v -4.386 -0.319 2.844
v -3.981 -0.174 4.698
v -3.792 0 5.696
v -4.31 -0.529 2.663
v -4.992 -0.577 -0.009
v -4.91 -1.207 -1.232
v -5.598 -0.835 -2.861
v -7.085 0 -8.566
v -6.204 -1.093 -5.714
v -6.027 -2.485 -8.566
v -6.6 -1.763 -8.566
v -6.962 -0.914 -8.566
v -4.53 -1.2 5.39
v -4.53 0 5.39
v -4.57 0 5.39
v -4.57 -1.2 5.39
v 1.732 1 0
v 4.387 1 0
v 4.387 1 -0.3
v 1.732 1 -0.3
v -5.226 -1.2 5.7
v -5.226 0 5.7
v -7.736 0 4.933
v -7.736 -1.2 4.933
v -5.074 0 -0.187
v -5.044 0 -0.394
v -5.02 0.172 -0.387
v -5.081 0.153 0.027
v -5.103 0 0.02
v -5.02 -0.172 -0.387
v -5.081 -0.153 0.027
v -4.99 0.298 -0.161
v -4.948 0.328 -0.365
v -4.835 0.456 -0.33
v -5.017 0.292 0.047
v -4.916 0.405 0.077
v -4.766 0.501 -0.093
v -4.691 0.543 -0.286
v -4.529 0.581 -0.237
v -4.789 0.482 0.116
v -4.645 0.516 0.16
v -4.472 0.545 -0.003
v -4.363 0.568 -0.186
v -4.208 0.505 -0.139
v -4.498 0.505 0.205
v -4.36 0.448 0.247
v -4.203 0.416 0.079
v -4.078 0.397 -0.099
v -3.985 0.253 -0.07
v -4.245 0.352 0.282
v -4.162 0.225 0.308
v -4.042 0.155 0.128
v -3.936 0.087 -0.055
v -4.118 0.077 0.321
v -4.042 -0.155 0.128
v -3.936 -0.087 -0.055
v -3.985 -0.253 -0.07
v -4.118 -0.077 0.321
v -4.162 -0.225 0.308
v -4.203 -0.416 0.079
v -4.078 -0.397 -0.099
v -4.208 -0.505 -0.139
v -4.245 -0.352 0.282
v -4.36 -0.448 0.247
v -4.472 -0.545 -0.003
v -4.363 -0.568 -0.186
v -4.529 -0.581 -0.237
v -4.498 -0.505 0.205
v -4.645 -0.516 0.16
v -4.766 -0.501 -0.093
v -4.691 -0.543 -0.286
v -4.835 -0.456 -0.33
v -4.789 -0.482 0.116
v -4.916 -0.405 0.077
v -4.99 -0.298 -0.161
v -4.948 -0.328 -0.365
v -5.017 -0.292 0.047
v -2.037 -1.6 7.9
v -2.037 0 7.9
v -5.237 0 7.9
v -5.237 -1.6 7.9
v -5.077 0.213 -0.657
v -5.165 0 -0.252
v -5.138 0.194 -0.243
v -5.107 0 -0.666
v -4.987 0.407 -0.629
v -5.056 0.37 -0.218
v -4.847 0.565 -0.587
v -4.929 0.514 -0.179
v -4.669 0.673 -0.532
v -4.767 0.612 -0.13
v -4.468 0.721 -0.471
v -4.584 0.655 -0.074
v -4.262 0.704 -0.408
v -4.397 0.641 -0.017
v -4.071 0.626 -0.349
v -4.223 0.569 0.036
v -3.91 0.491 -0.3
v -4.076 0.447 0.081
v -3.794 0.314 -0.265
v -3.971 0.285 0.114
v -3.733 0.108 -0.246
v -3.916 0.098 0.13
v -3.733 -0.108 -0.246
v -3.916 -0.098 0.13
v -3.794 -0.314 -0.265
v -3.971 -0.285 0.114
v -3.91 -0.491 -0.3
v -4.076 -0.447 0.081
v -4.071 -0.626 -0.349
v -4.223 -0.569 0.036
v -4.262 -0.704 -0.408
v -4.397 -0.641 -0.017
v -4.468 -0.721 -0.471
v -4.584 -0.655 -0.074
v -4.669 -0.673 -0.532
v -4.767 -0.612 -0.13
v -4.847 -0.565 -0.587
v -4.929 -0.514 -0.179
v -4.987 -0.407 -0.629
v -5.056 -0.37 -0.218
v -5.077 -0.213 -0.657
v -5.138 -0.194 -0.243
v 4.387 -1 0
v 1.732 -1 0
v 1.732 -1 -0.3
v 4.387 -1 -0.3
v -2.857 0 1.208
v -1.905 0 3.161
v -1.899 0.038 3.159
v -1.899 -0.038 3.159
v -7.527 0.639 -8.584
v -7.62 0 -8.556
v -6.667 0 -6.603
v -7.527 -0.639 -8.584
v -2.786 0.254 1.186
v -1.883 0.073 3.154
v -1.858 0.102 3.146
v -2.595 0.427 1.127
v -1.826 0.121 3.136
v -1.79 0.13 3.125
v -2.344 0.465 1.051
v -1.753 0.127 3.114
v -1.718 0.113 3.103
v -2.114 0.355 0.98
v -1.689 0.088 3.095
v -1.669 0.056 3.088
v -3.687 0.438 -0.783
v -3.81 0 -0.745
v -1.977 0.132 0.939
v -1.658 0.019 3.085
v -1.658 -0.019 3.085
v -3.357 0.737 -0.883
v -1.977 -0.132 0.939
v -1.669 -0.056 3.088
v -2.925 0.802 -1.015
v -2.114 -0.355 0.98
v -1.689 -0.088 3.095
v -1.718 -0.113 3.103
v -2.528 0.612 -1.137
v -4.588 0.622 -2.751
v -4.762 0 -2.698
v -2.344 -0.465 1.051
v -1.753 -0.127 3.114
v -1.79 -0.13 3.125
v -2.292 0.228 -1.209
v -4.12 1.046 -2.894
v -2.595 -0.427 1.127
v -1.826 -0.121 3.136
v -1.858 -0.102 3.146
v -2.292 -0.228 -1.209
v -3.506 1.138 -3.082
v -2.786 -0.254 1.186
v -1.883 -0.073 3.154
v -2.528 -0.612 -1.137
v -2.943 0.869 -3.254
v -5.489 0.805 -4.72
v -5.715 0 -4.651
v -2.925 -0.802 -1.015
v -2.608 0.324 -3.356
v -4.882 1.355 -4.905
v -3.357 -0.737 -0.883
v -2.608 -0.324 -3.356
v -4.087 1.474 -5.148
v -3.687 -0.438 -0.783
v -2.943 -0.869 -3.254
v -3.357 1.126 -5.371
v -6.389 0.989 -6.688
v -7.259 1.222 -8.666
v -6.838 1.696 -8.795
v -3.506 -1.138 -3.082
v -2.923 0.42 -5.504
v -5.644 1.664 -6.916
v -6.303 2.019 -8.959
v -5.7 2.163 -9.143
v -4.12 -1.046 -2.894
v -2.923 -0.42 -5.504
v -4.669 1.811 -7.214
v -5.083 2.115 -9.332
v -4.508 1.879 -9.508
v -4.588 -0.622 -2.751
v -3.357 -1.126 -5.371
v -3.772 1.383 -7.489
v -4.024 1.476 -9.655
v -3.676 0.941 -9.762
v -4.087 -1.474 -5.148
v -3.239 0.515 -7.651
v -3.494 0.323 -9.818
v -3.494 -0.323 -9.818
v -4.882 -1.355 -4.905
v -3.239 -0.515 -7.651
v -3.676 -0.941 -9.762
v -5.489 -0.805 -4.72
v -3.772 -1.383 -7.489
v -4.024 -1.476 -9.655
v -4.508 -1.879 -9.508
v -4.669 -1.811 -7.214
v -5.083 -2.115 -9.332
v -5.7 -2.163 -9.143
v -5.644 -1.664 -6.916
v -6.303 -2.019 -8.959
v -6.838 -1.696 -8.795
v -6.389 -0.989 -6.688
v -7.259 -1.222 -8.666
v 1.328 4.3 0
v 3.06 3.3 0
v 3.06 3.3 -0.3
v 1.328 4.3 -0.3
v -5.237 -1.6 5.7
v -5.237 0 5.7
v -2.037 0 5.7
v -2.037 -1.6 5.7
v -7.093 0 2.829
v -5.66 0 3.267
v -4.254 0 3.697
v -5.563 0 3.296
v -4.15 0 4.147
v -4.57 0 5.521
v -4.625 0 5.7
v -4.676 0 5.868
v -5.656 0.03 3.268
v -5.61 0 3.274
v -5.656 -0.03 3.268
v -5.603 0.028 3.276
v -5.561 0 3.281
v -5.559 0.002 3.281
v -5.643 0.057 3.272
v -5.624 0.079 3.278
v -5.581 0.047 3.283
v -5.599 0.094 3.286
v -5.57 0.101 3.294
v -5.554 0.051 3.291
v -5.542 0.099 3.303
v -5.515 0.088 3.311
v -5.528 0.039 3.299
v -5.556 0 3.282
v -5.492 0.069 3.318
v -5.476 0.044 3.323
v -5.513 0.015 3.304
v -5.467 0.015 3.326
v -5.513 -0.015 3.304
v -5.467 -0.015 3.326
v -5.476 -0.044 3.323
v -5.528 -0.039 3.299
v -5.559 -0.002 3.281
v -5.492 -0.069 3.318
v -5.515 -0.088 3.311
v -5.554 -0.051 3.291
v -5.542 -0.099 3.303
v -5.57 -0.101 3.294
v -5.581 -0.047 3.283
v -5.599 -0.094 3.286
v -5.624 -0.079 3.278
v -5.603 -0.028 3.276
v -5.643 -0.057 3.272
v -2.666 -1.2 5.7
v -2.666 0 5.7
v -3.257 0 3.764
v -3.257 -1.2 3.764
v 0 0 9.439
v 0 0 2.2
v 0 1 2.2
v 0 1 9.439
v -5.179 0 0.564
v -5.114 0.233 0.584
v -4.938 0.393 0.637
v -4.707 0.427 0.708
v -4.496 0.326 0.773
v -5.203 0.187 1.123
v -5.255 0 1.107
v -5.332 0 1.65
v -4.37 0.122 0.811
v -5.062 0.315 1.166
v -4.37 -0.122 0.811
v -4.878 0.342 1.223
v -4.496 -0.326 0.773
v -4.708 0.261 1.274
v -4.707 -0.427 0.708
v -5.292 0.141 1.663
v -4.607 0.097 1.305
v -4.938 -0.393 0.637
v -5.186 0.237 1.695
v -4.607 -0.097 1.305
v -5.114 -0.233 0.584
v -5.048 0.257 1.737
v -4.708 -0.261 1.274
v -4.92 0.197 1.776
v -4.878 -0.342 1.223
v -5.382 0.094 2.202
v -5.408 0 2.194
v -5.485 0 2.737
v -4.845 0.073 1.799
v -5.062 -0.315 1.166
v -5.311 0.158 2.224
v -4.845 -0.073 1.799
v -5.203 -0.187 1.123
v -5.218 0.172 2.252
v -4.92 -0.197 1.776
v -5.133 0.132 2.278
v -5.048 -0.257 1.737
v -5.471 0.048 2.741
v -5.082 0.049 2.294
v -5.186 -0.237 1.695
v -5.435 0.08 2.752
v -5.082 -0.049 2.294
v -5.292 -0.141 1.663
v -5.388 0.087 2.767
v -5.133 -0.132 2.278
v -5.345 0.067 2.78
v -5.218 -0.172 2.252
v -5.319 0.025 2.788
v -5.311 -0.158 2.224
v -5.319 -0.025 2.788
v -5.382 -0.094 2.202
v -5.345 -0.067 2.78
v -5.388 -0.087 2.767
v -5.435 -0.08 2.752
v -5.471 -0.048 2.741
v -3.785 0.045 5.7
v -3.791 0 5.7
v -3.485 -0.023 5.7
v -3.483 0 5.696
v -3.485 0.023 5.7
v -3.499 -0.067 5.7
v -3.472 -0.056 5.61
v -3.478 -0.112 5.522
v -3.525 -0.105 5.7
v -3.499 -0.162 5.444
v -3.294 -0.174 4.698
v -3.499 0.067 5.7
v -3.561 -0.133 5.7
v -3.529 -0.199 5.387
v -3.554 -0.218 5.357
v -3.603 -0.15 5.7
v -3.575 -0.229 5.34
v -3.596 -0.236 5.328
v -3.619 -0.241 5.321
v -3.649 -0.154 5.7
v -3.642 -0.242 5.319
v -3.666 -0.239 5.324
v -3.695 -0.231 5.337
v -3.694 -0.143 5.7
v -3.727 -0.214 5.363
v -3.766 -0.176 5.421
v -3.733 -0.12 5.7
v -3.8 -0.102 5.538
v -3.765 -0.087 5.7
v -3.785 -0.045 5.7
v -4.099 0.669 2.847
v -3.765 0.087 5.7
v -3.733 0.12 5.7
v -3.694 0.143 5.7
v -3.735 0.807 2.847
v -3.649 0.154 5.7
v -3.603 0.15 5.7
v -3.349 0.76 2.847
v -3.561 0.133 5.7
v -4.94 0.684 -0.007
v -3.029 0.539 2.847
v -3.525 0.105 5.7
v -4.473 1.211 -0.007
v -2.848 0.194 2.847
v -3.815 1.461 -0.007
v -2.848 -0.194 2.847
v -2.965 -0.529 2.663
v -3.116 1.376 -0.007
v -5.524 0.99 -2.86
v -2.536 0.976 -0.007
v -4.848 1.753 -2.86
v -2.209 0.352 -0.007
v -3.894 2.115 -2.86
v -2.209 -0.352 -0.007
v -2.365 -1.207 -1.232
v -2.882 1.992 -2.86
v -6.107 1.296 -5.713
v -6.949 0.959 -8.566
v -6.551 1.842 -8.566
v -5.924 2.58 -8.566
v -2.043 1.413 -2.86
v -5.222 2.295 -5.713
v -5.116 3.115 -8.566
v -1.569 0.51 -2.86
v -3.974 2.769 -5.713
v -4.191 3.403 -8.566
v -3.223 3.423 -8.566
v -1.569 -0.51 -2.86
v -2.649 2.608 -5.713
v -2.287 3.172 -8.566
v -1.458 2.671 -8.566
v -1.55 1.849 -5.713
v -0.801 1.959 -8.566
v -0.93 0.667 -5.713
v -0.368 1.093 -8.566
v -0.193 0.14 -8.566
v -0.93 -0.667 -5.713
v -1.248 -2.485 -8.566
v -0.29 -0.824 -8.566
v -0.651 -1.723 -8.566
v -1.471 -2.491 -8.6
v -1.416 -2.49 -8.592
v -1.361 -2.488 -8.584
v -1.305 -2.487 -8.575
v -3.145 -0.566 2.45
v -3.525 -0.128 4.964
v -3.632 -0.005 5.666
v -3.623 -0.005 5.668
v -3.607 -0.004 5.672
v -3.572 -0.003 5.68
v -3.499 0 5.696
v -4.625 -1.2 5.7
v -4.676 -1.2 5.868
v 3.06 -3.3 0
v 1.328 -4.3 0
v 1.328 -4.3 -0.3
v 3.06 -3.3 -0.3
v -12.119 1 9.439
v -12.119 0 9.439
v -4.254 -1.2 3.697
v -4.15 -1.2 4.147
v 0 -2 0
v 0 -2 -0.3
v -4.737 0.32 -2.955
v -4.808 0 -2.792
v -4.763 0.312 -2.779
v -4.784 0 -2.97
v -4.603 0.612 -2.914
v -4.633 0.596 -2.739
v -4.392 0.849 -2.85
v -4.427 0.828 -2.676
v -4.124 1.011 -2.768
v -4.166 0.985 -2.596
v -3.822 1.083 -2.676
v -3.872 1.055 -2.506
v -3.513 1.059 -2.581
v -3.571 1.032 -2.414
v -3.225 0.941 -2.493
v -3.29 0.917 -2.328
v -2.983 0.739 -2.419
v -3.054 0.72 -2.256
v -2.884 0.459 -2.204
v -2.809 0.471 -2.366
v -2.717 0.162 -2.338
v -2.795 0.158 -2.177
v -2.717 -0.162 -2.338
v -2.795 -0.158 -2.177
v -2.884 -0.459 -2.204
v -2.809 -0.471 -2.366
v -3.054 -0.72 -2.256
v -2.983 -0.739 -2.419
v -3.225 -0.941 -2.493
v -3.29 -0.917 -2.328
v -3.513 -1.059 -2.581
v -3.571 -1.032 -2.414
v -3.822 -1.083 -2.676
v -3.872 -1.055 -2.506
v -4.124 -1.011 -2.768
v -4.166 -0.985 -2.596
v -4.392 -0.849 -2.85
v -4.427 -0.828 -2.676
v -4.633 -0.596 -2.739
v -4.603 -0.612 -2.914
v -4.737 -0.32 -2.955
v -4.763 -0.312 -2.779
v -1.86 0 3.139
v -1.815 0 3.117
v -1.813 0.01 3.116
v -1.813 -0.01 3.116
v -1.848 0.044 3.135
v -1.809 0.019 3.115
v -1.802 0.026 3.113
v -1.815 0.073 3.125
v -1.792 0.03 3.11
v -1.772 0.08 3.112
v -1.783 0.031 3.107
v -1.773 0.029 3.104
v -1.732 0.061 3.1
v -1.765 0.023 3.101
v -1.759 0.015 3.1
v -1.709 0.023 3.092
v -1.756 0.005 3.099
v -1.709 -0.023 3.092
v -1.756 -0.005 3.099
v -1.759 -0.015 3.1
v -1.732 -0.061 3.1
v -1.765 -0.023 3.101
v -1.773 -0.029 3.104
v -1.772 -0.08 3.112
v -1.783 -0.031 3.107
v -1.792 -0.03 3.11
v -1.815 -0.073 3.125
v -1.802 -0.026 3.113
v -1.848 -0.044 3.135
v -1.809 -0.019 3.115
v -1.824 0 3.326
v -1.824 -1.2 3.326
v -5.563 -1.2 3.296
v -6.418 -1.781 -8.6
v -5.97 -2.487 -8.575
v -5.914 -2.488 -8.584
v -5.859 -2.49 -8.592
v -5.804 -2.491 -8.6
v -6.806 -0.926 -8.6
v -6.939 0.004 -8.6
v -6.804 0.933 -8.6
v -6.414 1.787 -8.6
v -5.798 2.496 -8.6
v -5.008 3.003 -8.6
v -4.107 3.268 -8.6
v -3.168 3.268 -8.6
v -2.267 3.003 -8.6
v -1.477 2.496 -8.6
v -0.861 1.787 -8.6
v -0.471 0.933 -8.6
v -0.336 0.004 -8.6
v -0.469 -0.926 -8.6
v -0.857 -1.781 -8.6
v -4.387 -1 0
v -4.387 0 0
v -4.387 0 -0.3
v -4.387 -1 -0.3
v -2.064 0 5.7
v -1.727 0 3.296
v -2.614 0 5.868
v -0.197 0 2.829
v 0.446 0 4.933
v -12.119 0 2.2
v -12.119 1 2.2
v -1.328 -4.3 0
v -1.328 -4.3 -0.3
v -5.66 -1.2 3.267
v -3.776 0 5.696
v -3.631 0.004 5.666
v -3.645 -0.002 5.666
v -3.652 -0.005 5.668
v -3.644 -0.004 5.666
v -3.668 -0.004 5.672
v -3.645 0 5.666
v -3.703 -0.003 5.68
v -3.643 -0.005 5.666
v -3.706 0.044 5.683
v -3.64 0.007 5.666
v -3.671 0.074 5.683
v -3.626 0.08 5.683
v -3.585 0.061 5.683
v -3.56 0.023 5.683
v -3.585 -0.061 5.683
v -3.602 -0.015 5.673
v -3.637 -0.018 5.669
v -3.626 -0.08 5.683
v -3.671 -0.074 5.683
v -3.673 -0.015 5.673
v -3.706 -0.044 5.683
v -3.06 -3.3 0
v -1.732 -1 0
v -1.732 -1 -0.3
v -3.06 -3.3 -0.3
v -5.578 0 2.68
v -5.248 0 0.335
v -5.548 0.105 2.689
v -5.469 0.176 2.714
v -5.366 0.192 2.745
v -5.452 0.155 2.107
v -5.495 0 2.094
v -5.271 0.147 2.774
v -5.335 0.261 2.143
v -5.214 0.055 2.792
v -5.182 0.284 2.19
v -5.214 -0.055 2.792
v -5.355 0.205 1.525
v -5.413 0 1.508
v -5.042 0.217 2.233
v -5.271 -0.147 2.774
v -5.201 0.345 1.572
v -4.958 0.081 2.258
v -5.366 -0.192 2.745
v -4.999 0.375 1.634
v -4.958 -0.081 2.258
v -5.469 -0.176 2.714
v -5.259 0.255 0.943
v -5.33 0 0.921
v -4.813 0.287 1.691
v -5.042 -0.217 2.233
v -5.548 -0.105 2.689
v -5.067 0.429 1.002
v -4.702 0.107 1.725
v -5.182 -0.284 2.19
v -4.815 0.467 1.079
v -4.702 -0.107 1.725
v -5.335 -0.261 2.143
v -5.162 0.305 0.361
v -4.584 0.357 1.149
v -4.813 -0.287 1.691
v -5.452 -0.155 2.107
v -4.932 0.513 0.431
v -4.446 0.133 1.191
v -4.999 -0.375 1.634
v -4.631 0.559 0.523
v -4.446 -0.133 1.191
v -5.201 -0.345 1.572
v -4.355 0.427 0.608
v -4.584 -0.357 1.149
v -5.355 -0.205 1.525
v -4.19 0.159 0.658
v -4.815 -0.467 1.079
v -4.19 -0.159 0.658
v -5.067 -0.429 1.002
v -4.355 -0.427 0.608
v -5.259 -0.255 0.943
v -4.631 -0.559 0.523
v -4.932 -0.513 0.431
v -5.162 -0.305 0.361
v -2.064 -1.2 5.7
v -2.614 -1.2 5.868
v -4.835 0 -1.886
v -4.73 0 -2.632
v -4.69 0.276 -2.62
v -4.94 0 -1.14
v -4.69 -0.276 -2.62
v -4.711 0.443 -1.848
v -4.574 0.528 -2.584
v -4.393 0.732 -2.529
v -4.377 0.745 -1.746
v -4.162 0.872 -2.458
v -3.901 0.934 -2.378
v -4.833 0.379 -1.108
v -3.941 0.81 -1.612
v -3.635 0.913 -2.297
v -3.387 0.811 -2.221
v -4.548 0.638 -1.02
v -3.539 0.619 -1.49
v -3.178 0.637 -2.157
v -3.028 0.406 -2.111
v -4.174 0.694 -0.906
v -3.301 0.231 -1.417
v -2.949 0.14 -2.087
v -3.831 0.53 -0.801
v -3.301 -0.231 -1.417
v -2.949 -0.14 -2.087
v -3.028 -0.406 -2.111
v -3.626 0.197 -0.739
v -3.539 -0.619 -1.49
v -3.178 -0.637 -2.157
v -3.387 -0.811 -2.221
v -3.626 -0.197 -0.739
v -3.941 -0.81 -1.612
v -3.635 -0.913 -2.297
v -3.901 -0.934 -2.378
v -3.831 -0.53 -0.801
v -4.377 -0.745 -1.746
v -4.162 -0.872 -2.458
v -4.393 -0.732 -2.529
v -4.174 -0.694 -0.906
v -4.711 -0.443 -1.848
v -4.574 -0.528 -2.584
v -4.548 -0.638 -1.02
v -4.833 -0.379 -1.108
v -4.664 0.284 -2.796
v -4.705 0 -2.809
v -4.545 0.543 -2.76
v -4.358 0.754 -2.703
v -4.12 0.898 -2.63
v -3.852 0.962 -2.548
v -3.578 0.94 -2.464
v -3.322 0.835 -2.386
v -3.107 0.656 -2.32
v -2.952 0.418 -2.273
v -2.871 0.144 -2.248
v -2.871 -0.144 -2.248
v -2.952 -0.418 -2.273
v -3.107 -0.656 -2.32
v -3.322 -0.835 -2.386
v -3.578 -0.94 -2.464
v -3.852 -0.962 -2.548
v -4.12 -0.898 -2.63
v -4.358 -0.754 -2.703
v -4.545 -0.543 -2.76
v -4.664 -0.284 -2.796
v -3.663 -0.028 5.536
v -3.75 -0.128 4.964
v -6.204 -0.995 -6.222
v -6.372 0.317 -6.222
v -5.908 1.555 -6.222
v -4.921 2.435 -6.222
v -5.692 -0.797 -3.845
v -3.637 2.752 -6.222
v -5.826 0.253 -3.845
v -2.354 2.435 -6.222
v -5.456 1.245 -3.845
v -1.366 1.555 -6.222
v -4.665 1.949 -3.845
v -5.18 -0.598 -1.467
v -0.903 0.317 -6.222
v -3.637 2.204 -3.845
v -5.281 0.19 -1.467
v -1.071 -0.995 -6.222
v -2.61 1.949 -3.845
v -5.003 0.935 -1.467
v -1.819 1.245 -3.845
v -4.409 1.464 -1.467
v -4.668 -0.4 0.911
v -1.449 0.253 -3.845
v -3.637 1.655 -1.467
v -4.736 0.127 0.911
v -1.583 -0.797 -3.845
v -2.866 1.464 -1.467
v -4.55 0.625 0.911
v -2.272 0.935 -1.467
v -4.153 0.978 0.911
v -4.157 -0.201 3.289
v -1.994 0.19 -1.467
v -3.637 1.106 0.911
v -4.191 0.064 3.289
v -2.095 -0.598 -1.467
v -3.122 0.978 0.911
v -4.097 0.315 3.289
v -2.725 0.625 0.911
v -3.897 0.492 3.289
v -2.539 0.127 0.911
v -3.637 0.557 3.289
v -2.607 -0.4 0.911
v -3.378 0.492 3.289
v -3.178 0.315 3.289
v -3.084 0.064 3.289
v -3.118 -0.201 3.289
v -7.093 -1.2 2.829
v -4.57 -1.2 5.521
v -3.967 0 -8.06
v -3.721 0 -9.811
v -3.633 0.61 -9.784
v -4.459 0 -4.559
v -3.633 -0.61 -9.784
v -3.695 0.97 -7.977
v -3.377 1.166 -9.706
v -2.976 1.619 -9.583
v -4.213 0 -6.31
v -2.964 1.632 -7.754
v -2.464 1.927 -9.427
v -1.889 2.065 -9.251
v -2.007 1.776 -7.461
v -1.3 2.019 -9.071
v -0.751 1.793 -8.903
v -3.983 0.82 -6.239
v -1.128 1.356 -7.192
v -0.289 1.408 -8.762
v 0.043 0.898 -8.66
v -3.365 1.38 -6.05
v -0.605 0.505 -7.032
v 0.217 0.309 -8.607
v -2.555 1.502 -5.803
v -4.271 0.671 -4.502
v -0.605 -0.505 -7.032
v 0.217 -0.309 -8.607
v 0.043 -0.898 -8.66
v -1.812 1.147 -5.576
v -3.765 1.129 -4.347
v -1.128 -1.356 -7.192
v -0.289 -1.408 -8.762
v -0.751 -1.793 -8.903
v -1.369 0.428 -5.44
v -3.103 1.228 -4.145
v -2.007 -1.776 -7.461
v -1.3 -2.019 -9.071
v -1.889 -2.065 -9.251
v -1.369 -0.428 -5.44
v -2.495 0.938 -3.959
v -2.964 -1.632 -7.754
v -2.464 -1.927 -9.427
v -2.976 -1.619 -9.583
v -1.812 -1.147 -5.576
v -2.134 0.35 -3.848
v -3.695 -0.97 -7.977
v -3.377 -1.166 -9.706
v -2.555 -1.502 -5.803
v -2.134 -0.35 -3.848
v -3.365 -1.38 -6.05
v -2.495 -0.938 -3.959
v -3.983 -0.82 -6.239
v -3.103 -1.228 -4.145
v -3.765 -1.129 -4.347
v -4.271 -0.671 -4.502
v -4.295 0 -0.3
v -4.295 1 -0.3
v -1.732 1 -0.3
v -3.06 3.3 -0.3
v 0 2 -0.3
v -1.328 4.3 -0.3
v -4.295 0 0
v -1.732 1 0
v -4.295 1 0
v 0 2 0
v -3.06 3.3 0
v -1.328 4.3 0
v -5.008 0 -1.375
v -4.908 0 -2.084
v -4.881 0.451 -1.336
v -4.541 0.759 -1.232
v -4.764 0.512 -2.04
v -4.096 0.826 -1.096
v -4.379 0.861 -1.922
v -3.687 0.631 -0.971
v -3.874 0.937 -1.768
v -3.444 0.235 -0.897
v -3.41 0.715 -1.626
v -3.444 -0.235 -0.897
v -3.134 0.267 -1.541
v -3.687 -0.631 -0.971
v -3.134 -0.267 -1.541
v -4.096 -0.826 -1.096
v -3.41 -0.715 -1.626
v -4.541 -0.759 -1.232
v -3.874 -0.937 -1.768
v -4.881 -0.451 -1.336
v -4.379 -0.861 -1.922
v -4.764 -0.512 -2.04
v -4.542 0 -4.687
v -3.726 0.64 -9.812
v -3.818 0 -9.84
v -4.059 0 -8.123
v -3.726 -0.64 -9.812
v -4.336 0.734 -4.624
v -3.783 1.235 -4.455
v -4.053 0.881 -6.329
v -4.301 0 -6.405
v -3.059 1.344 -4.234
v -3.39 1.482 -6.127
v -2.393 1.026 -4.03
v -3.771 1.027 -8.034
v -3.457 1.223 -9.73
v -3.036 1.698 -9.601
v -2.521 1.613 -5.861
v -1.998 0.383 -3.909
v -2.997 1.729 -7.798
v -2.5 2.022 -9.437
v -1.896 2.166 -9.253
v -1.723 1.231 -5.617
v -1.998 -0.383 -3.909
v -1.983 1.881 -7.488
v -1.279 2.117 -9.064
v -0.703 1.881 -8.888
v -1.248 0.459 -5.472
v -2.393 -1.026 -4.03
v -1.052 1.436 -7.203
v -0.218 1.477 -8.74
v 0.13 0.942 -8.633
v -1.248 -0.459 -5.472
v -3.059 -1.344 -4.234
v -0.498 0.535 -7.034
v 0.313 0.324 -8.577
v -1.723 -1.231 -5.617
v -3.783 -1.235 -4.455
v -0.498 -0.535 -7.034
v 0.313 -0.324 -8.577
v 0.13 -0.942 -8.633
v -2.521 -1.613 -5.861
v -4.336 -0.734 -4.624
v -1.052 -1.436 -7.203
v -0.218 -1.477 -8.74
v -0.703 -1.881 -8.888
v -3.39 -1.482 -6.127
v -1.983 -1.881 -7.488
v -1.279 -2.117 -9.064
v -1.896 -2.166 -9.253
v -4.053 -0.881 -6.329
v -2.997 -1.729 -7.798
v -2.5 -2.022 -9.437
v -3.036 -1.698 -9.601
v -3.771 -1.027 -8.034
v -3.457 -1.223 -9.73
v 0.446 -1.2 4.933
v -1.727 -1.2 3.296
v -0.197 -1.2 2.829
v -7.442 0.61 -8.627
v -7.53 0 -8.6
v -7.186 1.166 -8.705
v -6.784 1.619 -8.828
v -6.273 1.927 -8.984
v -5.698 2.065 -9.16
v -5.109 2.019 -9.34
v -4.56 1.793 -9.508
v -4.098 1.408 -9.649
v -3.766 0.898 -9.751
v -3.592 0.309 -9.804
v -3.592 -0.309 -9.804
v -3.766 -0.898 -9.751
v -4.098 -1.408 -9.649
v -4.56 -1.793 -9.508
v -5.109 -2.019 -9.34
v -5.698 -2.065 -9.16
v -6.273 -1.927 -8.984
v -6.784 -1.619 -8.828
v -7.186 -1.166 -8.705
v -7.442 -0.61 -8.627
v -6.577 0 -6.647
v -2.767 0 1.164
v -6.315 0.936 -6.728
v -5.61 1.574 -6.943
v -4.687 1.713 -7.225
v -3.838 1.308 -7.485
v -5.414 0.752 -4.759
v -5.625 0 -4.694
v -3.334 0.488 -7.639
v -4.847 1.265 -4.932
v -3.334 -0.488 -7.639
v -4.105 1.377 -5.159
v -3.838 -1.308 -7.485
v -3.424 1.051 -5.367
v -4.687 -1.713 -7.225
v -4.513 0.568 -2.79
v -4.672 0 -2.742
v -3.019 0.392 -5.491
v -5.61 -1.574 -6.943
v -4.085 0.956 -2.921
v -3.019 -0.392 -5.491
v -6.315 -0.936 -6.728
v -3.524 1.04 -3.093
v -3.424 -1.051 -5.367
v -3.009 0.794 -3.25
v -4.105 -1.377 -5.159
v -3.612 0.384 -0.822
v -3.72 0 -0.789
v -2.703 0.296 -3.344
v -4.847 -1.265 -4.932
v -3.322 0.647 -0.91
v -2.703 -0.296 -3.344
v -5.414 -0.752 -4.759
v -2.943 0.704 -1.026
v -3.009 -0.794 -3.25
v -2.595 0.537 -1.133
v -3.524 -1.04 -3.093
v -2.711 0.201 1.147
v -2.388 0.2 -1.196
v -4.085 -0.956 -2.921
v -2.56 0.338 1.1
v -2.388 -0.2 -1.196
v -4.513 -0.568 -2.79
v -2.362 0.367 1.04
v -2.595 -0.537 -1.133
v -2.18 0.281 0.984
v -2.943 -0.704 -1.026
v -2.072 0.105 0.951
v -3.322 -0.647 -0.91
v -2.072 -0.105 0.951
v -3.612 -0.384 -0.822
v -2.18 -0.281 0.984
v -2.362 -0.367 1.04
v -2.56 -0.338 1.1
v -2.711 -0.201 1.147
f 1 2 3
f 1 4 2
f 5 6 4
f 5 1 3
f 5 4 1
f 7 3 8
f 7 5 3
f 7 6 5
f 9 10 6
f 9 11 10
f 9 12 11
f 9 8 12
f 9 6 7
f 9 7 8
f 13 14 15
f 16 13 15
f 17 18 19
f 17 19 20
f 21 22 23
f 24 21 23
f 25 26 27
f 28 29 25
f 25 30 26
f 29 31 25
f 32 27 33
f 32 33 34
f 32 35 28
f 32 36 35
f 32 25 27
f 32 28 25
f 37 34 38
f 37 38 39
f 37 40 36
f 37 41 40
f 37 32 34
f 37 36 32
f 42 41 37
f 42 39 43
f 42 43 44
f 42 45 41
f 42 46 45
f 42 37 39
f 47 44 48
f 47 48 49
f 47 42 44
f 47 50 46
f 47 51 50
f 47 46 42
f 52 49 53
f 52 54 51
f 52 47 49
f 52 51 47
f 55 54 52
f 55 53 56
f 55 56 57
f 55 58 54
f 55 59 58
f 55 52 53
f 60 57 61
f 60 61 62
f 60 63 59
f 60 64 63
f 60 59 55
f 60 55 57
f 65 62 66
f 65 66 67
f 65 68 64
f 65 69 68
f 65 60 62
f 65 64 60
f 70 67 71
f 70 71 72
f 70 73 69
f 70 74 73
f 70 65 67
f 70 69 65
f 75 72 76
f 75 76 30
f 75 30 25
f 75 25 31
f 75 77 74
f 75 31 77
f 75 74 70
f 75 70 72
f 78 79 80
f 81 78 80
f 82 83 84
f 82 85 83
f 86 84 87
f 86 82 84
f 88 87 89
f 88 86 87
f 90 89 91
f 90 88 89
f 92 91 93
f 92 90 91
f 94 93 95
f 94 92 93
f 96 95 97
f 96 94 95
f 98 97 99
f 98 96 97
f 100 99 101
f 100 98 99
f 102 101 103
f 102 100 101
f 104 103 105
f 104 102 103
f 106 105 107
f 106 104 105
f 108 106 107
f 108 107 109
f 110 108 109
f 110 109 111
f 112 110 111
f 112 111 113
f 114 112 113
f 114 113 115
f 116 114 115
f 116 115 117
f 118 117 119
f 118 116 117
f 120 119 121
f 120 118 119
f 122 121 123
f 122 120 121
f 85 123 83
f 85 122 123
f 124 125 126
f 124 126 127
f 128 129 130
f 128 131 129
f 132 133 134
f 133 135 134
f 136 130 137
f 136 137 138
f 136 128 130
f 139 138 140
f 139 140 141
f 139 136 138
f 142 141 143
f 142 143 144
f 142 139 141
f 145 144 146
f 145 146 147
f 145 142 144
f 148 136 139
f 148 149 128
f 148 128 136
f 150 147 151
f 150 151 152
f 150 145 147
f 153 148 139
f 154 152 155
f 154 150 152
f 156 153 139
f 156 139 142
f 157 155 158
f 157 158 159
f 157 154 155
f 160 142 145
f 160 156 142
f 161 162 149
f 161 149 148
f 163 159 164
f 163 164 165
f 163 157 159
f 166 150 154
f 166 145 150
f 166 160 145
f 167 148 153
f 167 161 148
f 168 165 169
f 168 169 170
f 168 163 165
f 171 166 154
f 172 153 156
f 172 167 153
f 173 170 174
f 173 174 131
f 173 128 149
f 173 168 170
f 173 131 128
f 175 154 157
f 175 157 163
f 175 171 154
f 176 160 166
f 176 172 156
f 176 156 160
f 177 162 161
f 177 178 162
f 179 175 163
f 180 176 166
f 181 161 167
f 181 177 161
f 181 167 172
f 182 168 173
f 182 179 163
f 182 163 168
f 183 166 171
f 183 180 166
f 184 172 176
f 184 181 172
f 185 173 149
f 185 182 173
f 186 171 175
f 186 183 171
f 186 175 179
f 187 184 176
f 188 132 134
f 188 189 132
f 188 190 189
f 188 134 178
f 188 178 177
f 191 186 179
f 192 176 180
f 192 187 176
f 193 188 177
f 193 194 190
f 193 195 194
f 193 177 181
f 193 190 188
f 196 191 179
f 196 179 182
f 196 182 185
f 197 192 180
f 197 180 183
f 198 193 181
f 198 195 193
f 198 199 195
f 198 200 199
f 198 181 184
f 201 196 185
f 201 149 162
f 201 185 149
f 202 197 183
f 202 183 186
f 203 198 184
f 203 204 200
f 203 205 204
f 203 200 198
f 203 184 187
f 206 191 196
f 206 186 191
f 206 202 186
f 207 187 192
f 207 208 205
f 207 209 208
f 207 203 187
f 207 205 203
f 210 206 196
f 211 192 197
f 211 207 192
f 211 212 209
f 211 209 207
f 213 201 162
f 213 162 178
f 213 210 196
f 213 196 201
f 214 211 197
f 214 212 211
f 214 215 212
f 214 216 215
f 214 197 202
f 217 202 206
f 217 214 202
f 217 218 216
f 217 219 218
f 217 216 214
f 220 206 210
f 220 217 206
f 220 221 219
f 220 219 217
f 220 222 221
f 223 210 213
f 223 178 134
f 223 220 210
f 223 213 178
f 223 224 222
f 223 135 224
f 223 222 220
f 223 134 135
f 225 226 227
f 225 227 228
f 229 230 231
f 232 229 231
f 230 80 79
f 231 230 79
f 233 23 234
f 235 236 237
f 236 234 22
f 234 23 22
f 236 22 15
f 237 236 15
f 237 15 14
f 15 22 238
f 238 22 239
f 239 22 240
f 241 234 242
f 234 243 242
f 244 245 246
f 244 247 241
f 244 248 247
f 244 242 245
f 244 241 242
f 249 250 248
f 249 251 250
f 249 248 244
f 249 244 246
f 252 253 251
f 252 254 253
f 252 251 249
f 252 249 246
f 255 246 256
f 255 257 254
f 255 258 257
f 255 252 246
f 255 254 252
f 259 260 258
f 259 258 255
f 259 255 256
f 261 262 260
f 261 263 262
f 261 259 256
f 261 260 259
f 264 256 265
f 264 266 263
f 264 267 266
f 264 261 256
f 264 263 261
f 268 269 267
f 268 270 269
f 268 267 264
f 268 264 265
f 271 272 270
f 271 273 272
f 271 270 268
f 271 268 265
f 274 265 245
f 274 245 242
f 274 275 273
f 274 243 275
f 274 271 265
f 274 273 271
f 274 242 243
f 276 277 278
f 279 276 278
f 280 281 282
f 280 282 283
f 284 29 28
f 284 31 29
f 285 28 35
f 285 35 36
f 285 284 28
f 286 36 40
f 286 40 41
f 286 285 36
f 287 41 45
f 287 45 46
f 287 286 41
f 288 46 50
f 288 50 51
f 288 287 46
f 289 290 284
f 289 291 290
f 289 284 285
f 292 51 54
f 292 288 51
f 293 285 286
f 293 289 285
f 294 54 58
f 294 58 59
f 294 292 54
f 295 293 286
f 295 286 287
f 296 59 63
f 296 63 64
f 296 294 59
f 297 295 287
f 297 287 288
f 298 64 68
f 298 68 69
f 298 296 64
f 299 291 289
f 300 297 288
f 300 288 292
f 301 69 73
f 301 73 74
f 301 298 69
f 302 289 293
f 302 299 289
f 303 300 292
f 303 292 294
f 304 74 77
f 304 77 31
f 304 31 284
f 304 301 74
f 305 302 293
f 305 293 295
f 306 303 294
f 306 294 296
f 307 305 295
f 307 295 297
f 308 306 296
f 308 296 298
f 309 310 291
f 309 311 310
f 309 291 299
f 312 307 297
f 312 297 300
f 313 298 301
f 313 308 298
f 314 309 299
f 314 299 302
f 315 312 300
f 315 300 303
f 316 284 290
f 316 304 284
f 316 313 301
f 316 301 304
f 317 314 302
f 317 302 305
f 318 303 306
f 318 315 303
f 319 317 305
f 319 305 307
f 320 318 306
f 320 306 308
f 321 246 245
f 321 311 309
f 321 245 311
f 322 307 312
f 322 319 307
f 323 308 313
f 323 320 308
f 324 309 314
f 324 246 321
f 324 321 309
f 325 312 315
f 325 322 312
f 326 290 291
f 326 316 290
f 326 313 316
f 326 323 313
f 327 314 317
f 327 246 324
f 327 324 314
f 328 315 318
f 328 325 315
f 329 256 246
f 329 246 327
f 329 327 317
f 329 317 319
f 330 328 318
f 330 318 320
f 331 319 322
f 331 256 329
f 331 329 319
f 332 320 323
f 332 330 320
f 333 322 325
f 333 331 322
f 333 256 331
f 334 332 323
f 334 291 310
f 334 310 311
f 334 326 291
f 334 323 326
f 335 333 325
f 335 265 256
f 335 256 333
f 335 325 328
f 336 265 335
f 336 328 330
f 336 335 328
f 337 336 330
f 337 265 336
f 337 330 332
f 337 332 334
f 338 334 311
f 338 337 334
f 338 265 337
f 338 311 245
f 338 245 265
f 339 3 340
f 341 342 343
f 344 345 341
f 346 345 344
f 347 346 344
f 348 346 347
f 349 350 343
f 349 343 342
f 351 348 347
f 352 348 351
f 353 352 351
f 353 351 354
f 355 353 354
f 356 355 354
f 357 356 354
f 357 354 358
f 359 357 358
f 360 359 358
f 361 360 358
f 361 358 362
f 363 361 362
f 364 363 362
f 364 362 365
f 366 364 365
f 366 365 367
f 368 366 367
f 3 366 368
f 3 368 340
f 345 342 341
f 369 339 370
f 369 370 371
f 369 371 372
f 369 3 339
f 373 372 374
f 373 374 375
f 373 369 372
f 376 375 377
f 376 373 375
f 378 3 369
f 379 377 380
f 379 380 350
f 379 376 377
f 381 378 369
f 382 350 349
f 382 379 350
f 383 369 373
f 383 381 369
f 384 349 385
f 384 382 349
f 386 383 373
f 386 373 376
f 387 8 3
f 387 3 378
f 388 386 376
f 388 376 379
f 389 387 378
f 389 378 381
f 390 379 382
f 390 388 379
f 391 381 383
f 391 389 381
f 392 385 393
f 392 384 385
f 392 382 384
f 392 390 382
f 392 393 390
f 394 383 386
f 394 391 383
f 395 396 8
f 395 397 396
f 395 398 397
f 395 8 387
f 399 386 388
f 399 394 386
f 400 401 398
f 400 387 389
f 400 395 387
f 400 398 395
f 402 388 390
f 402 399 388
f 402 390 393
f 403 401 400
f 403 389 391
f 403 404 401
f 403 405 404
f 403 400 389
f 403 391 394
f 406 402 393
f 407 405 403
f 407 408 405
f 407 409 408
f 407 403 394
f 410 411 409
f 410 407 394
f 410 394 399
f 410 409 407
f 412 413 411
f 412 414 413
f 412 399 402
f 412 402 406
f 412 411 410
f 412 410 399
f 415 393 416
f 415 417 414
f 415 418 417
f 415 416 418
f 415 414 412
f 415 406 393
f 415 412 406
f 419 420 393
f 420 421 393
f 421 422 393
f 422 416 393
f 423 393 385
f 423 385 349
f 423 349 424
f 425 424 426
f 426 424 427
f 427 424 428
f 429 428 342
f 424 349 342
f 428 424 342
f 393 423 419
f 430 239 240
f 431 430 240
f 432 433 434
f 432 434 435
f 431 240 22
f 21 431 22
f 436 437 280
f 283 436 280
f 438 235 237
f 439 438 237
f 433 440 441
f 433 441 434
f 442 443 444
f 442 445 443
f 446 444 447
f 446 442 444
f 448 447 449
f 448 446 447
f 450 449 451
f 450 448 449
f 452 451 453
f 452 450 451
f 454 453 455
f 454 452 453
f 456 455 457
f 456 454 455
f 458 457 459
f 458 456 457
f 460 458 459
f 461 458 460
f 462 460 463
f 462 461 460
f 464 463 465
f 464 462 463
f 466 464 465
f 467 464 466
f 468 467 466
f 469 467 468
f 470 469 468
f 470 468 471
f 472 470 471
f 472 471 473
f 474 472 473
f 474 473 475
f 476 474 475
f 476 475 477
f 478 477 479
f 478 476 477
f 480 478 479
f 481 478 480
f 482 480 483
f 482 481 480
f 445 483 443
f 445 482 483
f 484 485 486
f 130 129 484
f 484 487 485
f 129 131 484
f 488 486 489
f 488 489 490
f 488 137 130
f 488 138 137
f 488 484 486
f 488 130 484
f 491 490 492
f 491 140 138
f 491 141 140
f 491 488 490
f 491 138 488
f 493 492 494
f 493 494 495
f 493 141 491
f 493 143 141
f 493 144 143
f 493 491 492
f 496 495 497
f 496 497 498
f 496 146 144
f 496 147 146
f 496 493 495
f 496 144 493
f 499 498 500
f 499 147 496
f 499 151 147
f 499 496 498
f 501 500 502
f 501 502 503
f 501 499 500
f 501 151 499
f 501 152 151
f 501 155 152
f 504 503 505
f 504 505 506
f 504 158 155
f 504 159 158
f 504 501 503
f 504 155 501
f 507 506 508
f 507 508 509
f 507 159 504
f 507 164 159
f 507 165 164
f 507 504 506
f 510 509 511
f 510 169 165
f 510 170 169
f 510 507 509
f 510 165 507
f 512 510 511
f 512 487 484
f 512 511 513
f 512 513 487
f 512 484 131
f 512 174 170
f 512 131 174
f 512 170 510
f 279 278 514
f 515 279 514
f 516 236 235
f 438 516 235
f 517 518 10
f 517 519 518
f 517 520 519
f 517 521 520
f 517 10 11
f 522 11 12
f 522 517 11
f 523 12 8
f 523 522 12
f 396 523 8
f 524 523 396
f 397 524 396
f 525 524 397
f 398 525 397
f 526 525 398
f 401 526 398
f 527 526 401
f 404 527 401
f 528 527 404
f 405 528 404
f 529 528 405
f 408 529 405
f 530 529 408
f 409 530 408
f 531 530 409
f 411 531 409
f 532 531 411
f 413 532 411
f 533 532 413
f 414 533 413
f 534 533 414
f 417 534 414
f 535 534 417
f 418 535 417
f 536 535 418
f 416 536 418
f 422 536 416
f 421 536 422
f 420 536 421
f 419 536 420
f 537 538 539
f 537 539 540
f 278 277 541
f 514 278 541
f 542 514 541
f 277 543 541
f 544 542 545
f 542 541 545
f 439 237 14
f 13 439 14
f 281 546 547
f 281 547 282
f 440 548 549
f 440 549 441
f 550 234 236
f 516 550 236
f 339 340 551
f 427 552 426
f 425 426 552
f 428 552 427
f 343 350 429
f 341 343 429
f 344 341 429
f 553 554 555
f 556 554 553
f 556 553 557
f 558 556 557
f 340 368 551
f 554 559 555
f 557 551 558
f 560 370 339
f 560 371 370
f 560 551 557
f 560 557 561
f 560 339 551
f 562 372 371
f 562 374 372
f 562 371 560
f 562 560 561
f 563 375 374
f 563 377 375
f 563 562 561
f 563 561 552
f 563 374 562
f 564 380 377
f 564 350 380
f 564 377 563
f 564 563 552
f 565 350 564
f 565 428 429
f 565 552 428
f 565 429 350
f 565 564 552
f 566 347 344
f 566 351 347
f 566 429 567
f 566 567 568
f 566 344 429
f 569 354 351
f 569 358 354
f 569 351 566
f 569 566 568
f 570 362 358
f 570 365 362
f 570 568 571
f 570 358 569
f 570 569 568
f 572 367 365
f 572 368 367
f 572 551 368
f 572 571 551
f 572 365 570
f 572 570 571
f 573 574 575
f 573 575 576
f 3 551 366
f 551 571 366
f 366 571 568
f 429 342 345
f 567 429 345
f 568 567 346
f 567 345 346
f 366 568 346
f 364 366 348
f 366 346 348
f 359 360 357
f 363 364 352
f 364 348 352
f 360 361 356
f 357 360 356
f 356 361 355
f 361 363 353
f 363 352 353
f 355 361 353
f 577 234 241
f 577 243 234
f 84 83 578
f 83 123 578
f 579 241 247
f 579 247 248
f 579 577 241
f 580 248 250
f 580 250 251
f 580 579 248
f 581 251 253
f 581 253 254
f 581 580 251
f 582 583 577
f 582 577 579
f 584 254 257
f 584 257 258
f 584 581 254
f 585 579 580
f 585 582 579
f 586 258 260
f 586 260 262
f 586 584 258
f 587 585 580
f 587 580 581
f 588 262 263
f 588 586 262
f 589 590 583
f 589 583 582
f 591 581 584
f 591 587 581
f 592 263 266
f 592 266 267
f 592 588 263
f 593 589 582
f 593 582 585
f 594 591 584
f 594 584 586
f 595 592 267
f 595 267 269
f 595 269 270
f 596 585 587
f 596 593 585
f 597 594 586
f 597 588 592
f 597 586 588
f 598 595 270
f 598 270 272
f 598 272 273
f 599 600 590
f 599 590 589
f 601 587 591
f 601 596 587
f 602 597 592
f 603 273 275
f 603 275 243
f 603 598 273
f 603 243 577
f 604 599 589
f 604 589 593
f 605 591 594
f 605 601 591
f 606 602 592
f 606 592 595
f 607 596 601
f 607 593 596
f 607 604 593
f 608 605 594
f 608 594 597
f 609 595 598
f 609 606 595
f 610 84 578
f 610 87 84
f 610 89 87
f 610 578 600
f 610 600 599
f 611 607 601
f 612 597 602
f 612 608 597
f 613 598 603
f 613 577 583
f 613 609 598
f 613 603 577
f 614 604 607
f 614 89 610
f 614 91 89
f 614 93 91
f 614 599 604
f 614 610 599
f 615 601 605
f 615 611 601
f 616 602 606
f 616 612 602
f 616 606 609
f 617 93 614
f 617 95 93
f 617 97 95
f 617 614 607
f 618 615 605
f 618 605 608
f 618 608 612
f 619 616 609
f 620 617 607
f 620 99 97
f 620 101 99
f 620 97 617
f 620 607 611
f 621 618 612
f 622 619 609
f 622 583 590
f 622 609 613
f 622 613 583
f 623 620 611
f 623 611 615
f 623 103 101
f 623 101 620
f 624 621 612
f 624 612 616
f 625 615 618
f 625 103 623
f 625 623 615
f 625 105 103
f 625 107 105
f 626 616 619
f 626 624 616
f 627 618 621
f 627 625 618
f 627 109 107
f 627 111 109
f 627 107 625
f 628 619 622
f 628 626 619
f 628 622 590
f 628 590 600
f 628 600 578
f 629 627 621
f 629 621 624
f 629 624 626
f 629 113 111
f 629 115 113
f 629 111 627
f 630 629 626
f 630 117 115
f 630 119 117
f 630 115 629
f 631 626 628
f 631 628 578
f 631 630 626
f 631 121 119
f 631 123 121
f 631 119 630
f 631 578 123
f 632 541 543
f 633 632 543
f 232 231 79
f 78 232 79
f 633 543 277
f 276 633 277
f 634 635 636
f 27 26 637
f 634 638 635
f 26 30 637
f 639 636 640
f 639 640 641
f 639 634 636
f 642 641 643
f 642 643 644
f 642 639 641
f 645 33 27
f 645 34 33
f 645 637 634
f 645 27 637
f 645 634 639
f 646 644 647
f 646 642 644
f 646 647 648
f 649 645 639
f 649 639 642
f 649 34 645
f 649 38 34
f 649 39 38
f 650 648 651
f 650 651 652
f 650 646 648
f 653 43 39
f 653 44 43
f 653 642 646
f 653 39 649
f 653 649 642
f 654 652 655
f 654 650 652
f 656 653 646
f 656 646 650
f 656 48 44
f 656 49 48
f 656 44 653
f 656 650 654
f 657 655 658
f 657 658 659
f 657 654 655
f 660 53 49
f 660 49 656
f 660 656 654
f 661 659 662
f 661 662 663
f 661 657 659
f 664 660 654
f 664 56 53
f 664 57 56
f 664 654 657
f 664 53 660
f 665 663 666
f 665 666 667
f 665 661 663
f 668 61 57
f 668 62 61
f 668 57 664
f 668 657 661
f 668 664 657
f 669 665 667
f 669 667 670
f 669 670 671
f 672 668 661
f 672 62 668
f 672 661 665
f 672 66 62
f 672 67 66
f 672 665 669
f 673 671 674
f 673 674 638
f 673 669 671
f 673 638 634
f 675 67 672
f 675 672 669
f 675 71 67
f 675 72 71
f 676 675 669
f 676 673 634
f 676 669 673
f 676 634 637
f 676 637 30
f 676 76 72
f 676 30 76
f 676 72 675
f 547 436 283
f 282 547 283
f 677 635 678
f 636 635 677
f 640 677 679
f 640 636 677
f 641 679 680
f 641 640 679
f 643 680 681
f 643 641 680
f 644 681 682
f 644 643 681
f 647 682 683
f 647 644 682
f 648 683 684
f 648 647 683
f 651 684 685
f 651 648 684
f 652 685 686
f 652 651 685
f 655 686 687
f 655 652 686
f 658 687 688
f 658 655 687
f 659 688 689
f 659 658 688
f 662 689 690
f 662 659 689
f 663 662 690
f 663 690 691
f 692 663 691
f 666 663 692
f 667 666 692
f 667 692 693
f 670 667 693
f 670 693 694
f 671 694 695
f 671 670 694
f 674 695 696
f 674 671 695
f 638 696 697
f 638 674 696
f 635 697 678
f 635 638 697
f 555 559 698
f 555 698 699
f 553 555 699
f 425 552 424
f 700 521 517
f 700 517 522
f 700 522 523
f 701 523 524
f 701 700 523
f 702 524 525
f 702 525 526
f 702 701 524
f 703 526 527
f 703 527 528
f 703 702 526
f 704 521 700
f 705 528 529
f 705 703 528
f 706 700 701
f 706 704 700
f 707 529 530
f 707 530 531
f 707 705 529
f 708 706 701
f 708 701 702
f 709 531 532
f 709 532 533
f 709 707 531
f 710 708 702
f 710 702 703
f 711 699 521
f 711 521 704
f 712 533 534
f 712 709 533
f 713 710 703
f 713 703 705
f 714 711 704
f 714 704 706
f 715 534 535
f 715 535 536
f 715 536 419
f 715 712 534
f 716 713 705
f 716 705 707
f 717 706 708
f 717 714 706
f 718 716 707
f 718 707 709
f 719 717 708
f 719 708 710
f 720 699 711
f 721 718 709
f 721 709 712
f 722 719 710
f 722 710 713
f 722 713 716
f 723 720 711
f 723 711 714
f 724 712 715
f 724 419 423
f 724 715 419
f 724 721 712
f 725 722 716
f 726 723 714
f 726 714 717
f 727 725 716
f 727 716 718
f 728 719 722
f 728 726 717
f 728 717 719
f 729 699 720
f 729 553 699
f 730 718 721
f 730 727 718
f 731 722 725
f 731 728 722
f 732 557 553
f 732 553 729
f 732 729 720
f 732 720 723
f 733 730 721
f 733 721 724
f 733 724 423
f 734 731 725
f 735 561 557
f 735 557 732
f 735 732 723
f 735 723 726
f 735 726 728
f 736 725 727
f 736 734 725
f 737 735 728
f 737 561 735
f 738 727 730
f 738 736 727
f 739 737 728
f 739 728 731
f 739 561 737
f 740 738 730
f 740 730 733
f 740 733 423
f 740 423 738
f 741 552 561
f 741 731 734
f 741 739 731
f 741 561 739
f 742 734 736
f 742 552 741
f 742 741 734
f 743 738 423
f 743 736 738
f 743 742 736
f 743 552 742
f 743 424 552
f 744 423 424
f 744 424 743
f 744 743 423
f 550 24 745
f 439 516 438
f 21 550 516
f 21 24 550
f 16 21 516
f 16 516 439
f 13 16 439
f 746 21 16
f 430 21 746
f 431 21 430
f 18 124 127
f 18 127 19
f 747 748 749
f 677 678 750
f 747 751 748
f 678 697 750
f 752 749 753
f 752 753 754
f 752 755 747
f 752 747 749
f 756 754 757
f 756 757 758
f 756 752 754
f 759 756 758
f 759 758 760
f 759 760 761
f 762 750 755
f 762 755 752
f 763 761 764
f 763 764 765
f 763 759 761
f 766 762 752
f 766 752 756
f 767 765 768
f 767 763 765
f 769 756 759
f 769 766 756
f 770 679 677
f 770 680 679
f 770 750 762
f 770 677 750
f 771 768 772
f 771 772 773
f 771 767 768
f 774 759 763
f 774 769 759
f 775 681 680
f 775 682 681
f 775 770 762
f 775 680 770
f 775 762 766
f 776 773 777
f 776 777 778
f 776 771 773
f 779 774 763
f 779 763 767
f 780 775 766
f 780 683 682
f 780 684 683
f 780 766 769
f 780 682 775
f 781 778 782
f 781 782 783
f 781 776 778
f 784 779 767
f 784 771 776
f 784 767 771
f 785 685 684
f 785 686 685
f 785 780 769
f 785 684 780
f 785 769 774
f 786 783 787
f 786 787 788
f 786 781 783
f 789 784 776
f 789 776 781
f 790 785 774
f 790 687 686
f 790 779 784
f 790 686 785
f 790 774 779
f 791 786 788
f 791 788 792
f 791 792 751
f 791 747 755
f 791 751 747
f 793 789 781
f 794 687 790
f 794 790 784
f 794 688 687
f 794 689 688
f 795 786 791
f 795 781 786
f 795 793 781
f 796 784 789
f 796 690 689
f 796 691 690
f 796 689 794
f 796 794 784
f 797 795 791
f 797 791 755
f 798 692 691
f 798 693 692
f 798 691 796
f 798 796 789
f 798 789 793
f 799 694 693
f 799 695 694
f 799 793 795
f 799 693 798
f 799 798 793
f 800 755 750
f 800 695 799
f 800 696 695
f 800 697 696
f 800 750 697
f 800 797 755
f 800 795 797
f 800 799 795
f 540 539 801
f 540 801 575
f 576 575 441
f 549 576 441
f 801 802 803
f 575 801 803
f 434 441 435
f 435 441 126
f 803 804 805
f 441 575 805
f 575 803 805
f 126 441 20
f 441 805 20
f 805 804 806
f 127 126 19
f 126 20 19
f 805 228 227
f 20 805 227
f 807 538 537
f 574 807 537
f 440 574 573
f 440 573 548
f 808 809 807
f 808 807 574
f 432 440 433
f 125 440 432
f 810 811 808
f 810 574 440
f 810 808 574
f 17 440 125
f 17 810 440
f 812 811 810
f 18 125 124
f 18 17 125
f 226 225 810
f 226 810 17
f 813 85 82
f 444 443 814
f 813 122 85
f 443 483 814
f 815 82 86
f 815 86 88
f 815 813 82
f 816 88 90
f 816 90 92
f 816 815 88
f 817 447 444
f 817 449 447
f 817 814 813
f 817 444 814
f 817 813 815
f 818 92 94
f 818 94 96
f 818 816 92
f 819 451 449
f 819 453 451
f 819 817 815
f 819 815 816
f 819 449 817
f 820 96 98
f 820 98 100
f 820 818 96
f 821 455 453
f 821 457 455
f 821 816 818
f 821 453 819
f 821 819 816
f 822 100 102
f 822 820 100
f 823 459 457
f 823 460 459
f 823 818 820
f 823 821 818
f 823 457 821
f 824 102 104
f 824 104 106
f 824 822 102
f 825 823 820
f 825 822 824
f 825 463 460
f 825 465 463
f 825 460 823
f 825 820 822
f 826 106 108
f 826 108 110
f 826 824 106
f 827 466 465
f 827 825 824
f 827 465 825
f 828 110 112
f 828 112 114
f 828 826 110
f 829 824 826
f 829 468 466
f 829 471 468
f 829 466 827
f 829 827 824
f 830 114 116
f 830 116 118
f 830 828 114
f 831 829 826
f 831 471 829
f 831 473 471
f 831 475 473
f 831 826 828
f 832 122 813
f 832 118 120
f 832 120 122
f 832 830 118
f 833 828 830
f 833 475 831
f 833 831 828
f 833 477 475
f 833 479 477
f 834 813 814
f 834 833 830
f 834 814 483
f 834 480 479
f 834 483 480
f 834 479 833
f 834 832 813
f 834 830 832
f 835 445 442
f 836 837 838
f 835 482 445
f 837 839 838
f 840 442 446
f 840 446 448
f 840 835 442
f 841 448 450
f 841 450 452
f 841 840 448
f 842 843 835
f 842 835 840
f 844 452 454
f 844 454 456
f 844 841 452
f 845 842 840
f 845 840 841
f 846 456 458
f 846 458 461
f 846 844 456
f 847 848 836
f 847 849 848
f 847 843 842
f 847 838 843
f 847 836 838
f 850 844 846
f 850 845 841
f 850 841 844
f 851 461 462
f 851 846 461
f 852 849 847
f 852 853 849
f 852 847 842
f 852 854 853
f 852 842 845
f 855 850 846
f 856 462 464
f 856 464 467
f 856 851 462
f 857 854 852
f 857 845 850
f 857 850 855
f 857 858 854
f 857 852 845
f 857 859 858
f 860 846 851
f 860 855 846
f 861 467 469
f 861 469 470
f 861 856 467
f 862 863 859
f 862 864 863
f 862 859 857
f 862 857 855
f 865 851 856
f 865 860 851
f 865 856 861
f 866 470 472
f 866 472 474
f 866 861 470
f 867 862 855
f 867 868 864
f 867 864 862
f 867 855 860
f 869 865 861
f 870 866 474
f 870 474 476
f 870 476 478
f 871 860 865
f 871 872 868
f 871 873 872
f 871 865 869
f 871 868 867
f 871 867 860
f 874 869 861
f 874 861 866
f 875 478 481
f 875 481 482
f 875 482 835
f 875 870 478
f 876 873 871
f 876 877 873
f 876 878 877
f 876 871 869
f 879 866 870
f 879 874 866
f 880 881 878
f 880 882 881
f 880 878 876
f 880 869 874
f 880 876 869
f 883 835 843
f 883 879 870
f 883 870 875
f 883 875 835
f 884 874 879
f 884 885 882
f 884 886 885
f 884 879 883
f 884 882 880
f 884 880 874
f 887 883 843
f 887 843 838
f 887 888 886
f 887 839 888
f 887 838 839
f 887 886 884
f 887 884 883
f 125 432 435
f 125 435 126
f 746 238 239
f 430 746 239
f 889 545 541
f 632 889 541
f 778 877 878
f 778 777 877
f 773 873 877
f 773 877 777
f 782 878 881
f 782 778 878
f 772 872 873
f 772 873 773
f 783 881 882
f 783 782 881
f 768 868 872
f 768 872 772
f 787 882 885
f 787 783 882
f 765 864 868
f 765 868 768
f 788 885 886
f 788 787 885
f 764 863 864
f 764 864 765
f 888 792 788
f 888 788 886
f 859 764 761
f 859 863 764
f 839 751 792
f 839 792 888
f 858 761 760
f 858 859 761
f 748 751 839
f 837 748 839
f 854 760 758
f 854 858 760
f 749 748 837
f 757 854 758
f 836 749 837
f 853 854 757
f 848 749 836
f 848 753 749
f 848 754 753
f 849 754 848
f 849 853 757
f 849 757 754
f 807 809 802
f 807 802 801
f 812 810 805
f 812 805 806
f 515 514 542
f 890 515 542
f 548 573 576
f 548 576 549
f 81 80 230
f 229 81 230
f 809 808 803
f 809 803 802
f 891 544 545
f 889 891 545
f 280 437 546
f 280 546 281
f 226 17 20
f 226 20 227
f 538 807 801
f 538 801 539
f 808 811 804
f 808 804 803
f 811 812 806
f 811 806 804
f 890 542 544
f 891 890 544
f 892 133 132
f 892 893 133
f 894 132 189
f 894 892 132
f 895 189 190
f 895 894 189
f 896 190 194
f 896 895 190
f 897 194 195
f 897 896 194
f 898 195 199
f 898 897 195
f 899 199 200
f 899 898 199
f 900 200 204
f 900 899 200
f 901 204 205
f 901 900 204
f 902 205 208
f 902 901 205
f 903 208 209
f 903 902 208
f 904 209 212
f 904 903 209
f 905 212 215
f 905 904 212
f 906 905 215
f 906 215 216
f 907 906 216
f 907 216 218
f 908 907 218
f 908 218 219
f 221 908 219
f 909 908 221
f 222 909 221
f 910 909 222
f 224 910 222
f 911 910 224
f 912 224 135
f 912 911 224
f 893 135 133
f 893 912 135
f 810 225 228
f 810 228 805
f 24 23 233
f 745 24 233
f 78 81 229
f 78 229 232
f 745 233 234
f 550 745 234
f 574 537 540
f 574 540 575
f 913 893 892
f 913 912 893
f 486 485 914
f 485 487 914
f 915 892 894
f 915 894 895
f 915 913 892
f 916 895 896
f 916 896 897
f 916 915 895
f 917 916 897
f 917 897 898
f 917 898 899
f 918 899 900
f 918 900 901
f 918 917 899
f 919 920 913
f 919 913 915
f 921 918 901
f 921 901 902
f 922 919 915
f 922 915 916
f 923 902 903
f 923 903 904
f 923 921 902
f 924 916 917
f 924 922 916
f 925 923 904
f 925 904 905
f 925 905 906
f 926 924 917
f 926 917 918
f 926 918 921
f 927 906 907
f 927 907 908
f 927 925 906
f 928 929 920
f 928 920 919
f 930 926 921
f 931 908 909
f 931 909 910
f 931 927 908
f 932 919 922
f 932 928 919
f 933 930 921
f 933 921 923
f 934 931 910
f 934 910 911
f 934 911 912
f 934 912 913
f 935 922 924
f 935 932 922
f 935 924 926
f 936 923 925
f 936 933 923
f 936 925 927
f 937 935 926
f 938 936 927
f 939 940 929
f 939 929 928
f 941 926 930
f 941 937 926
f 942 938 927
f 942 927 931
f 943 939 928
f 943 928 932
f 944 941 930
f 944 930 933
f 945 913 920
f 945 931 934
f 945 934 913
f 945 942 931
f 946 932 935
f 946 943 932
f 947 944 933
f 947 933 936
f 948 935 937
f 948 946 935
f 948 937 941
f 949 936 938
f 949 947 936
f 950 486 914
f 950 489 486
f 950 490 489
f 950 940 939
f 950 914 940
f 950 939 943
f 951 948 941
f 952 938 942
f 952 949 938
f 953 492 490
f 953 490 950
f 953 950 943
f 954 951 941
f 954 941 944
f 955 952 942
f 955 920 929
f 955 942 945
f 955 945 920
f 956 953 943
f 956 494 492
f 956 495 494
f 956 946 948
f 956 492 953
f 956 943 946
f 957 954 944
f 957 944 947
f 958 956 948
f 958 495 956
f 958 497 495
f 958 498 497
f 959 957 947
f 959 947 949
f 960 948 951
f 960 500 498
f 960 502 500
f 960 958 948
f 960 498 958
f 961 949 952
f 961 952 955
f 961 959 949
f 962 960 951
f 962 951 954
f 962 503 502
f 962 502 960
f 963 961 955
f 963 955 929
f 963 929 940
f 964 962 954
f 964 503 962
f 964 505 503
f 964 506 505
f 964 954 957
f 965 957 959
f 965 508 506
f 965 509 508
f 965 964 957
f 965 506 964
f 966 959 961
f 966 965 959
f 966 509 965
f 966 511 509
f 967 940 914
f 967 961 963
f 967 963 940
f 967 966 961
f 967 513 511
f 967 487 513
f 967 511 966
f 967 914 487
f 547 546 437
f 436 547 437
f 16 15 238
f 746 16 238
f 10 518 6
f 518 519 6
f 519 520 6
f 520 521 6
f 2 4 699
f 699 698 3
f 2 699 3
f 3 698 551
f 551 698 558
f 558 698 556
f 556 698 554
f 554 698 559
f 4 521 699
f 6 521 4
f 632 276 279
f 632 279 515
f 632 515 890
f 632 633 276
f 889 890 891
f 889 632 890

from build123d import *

# Parameters (mm, degrees)
F3_DEPTH  = 0.3
F6_DEPTH  = 1.2
F7_DEPTH  = 1.6
F8_W      = 12.1187474579
F8_H      = 7.2388057597
F9_DEPTH  = 1
F13_DEPTH = 12.5


# Not quite as in the source:
# - a feature names something its author has since deleted; it is built from what else it names


with BuildPart() as f2:
    # F1 (on Front) → F2 (revolve)
    with BuildSketch(Plane.XZ):
        Polygon((-3.7210601673, -9.810751838), (-4.7051198674, -2.8088032427), (-4.7835134136, -2.9695338315), (-3.8178826888, -9.8403534535), align=None)
        Polygon((-5.1072294295, -0.6661746932), (-5.044458455, -0.3942837314), (-5.1027113349, 0.0202070469), (-5.1654823095, -0.2516839149), align=None)
        Polygon((-4.7051198674, -2.8088032427), (-4.7300080769, -2.6317144309), (-4.808401623, -2.7924450197), (-4.7835134136, -2.9695338315), align=None)
        Polygon((-5.1654823095, -0.2516839149), (-5.1027113349, 0.0202070469), (-5.5609535977, 3.280770169), (-5.6599804046, 3.2668528589), align=None)
        Polygon((-4.808401623, -2.7924450197), (-4.7300080769, -2.6317144309), (-5.044458455, -0.3942837314), (-5.1072294295, -0.6661746932), align=None)
    revolve(axis=Axis((-5.5178402688, 0, 3.1482272372), (0.2923717047, 0, -0.956304756)))


with BuildPart() as f3:
    # F0 (on Top) → F3 (new body)
    with BuildSketch(Plane.XY):
        Polygon((-3.0597665006, 3.2996710384), (-1.7320508076, 1), (-4.295240622, 1), (-4.295240622, 0), (-4.3874821937, 0), (-4.3874821937, -1), (-1.7320508076, -1), (-3.0597665006, -3.2996710384), (-1.3277156931, -4.2996710384), (0, -2), (1.3277156931, -4.2996710384), (3.0597665006, -3.2996710384), (1.7320508076, -1), (4.3874821937, -1), (4.3874821937, 1), (1.7320508076, 1), (3.0597665006, 3.2996710384), (1.3277156931, 4.2996710384), (0, 2), (-1.3277156931, 4.2996710384), align=None)
    extrude(amount=-F3_DEPTH)


with BuildPart() as f5:
    # F4 (on Front) → F5 (revolve)
    with BuildSketch(Plane.XZ):
        Polygon((-3.6452723001, 5.6662573418), (-3.7914278099, 5.7), (-7.0850528365, -8.5662573418), (-6.9388973268, -8.6), align=None)
    revolve(axis=Axis((-3.6374821937, 0, 5.545), (0, 0, -1)))

    # F12 (on Right) → F13 (cut, symmetric)
    with BuildSketch(Plane.YZ):
        Polygon((-2.7707505506, -10.2039054036), (0, 5.6963409297), (-10.1999649778, -10.2039054036), align=None)
    extrude(amount=F13_DEPTH, both=True, mode=Mode.SUBTRACT)


with BuildPart() as f6:
    # F1 (on Front) → F6 (new body)
    with BuildSketch(Plane.XZ):
        Polygon((-5.2261826705, 5.7), (-4.6248886842, 5.7), (-4.6762880239, 5.868119665), align=None)
        Polygon((-4.5701869432, 5.5210786674), (-4.6248886842, 5.7), (-5.2261826705, 5.7), (-7.736463243, 4.9325302099), (-7.0932454926, 2.8286597468), (-5.6599804046, 3.2668528589), (-5.5631578831, 3.2964544743), (-4.2539193968, 3.6967288489), (-4.1500189554, 4.1467711043), (-4.5301121729, 5.39), (-4.5701869432, 5.39), align=None)
    extrude(amount=F6_DEPTH)


with BuildPart() as f6b:
    # F1 (on Front) → F6, piece 2 (new body)
    with BuildSketch(Plane.XZ):
        Polygon((-2.0643619298, 5.7), (-2.6656559161, 5.7), (-3.2574743268, 3.7642492019), (-1.8242092387, 3.3260560898), (-1.7273867172, 3.2964544743), (-0.1972991077, 2.8286597468), (0.4459186427, 4.9325302099), align=None)
        Polygon((-2.6142565764, 5.868119665), (-2.6656559161, 5.7), (-2.0643619298, 5.7), align=None)
    extrude(amount=F6_DEPTH)


with BuildPart() as f7:
    # F1 (on Front) → F7 (new body)
    with BuildSketch(Plane.XZ):
        Polygon((-3.6374821937, 5.7), (-2.9229645152, 5.7), (-2.6656559161, 5.7), (-2.6142565764, 5.868119665), (-2.0643619298, 5.7), (-2.0374821937, 5.7), (-2.0374821937, 7.9), (-5.2374821937, 7.9), (-5.2374821937, 6.6), (-5.2374821937, 5.7), (-5.2261826705, 5.7), (-4.6762880239, 5.868119665), (-4.6248886842, 5.7), (-4.5701869432, 5.7), (-3.7914278099, 5.7), align=None)
        Polygon((-2.6142565764, 5.868119665), (-2.6656559161, 5.7), (-2.0643619298, 5.7), align=None)
        Polygon((-5.2261826705, 5.7), (-4.6248886842, 5.7), (-4.6762880239, 5.868119665), align=None)
    extrude(amount=F7_DEPTH)


with BuildPart() as f9:
    # F8 (on Front) → F9 (new body)
    with BuildSketch(Plane.XZ):
        with Locations((-6.0593737289, 5.8194028798)):
            Rectangle(F8_W, F8_H)
    extrude(amount=-F9_DEPTH)


with BuildPart() as f11:
    # F10 (on Front) → F11 (revolve)
    with BuildSketch(Plane.XZ):
        Polygon((-1.8150609466, 3.1166956651), (-1.9049403512, 3.1605327798), (-7.6195546574, -8.5561628853), (-7.5296752528, -8.6), align=None)
    revolve(axis=Axis((-1.7727043315, 0, 3.1482272372), (-0.2923717047, 0, -0.956304756)))


solid = Compound([f2.part, f3.part, f5.part, f6.part, f6b.part, f7.part, f9.part, f11.part])
